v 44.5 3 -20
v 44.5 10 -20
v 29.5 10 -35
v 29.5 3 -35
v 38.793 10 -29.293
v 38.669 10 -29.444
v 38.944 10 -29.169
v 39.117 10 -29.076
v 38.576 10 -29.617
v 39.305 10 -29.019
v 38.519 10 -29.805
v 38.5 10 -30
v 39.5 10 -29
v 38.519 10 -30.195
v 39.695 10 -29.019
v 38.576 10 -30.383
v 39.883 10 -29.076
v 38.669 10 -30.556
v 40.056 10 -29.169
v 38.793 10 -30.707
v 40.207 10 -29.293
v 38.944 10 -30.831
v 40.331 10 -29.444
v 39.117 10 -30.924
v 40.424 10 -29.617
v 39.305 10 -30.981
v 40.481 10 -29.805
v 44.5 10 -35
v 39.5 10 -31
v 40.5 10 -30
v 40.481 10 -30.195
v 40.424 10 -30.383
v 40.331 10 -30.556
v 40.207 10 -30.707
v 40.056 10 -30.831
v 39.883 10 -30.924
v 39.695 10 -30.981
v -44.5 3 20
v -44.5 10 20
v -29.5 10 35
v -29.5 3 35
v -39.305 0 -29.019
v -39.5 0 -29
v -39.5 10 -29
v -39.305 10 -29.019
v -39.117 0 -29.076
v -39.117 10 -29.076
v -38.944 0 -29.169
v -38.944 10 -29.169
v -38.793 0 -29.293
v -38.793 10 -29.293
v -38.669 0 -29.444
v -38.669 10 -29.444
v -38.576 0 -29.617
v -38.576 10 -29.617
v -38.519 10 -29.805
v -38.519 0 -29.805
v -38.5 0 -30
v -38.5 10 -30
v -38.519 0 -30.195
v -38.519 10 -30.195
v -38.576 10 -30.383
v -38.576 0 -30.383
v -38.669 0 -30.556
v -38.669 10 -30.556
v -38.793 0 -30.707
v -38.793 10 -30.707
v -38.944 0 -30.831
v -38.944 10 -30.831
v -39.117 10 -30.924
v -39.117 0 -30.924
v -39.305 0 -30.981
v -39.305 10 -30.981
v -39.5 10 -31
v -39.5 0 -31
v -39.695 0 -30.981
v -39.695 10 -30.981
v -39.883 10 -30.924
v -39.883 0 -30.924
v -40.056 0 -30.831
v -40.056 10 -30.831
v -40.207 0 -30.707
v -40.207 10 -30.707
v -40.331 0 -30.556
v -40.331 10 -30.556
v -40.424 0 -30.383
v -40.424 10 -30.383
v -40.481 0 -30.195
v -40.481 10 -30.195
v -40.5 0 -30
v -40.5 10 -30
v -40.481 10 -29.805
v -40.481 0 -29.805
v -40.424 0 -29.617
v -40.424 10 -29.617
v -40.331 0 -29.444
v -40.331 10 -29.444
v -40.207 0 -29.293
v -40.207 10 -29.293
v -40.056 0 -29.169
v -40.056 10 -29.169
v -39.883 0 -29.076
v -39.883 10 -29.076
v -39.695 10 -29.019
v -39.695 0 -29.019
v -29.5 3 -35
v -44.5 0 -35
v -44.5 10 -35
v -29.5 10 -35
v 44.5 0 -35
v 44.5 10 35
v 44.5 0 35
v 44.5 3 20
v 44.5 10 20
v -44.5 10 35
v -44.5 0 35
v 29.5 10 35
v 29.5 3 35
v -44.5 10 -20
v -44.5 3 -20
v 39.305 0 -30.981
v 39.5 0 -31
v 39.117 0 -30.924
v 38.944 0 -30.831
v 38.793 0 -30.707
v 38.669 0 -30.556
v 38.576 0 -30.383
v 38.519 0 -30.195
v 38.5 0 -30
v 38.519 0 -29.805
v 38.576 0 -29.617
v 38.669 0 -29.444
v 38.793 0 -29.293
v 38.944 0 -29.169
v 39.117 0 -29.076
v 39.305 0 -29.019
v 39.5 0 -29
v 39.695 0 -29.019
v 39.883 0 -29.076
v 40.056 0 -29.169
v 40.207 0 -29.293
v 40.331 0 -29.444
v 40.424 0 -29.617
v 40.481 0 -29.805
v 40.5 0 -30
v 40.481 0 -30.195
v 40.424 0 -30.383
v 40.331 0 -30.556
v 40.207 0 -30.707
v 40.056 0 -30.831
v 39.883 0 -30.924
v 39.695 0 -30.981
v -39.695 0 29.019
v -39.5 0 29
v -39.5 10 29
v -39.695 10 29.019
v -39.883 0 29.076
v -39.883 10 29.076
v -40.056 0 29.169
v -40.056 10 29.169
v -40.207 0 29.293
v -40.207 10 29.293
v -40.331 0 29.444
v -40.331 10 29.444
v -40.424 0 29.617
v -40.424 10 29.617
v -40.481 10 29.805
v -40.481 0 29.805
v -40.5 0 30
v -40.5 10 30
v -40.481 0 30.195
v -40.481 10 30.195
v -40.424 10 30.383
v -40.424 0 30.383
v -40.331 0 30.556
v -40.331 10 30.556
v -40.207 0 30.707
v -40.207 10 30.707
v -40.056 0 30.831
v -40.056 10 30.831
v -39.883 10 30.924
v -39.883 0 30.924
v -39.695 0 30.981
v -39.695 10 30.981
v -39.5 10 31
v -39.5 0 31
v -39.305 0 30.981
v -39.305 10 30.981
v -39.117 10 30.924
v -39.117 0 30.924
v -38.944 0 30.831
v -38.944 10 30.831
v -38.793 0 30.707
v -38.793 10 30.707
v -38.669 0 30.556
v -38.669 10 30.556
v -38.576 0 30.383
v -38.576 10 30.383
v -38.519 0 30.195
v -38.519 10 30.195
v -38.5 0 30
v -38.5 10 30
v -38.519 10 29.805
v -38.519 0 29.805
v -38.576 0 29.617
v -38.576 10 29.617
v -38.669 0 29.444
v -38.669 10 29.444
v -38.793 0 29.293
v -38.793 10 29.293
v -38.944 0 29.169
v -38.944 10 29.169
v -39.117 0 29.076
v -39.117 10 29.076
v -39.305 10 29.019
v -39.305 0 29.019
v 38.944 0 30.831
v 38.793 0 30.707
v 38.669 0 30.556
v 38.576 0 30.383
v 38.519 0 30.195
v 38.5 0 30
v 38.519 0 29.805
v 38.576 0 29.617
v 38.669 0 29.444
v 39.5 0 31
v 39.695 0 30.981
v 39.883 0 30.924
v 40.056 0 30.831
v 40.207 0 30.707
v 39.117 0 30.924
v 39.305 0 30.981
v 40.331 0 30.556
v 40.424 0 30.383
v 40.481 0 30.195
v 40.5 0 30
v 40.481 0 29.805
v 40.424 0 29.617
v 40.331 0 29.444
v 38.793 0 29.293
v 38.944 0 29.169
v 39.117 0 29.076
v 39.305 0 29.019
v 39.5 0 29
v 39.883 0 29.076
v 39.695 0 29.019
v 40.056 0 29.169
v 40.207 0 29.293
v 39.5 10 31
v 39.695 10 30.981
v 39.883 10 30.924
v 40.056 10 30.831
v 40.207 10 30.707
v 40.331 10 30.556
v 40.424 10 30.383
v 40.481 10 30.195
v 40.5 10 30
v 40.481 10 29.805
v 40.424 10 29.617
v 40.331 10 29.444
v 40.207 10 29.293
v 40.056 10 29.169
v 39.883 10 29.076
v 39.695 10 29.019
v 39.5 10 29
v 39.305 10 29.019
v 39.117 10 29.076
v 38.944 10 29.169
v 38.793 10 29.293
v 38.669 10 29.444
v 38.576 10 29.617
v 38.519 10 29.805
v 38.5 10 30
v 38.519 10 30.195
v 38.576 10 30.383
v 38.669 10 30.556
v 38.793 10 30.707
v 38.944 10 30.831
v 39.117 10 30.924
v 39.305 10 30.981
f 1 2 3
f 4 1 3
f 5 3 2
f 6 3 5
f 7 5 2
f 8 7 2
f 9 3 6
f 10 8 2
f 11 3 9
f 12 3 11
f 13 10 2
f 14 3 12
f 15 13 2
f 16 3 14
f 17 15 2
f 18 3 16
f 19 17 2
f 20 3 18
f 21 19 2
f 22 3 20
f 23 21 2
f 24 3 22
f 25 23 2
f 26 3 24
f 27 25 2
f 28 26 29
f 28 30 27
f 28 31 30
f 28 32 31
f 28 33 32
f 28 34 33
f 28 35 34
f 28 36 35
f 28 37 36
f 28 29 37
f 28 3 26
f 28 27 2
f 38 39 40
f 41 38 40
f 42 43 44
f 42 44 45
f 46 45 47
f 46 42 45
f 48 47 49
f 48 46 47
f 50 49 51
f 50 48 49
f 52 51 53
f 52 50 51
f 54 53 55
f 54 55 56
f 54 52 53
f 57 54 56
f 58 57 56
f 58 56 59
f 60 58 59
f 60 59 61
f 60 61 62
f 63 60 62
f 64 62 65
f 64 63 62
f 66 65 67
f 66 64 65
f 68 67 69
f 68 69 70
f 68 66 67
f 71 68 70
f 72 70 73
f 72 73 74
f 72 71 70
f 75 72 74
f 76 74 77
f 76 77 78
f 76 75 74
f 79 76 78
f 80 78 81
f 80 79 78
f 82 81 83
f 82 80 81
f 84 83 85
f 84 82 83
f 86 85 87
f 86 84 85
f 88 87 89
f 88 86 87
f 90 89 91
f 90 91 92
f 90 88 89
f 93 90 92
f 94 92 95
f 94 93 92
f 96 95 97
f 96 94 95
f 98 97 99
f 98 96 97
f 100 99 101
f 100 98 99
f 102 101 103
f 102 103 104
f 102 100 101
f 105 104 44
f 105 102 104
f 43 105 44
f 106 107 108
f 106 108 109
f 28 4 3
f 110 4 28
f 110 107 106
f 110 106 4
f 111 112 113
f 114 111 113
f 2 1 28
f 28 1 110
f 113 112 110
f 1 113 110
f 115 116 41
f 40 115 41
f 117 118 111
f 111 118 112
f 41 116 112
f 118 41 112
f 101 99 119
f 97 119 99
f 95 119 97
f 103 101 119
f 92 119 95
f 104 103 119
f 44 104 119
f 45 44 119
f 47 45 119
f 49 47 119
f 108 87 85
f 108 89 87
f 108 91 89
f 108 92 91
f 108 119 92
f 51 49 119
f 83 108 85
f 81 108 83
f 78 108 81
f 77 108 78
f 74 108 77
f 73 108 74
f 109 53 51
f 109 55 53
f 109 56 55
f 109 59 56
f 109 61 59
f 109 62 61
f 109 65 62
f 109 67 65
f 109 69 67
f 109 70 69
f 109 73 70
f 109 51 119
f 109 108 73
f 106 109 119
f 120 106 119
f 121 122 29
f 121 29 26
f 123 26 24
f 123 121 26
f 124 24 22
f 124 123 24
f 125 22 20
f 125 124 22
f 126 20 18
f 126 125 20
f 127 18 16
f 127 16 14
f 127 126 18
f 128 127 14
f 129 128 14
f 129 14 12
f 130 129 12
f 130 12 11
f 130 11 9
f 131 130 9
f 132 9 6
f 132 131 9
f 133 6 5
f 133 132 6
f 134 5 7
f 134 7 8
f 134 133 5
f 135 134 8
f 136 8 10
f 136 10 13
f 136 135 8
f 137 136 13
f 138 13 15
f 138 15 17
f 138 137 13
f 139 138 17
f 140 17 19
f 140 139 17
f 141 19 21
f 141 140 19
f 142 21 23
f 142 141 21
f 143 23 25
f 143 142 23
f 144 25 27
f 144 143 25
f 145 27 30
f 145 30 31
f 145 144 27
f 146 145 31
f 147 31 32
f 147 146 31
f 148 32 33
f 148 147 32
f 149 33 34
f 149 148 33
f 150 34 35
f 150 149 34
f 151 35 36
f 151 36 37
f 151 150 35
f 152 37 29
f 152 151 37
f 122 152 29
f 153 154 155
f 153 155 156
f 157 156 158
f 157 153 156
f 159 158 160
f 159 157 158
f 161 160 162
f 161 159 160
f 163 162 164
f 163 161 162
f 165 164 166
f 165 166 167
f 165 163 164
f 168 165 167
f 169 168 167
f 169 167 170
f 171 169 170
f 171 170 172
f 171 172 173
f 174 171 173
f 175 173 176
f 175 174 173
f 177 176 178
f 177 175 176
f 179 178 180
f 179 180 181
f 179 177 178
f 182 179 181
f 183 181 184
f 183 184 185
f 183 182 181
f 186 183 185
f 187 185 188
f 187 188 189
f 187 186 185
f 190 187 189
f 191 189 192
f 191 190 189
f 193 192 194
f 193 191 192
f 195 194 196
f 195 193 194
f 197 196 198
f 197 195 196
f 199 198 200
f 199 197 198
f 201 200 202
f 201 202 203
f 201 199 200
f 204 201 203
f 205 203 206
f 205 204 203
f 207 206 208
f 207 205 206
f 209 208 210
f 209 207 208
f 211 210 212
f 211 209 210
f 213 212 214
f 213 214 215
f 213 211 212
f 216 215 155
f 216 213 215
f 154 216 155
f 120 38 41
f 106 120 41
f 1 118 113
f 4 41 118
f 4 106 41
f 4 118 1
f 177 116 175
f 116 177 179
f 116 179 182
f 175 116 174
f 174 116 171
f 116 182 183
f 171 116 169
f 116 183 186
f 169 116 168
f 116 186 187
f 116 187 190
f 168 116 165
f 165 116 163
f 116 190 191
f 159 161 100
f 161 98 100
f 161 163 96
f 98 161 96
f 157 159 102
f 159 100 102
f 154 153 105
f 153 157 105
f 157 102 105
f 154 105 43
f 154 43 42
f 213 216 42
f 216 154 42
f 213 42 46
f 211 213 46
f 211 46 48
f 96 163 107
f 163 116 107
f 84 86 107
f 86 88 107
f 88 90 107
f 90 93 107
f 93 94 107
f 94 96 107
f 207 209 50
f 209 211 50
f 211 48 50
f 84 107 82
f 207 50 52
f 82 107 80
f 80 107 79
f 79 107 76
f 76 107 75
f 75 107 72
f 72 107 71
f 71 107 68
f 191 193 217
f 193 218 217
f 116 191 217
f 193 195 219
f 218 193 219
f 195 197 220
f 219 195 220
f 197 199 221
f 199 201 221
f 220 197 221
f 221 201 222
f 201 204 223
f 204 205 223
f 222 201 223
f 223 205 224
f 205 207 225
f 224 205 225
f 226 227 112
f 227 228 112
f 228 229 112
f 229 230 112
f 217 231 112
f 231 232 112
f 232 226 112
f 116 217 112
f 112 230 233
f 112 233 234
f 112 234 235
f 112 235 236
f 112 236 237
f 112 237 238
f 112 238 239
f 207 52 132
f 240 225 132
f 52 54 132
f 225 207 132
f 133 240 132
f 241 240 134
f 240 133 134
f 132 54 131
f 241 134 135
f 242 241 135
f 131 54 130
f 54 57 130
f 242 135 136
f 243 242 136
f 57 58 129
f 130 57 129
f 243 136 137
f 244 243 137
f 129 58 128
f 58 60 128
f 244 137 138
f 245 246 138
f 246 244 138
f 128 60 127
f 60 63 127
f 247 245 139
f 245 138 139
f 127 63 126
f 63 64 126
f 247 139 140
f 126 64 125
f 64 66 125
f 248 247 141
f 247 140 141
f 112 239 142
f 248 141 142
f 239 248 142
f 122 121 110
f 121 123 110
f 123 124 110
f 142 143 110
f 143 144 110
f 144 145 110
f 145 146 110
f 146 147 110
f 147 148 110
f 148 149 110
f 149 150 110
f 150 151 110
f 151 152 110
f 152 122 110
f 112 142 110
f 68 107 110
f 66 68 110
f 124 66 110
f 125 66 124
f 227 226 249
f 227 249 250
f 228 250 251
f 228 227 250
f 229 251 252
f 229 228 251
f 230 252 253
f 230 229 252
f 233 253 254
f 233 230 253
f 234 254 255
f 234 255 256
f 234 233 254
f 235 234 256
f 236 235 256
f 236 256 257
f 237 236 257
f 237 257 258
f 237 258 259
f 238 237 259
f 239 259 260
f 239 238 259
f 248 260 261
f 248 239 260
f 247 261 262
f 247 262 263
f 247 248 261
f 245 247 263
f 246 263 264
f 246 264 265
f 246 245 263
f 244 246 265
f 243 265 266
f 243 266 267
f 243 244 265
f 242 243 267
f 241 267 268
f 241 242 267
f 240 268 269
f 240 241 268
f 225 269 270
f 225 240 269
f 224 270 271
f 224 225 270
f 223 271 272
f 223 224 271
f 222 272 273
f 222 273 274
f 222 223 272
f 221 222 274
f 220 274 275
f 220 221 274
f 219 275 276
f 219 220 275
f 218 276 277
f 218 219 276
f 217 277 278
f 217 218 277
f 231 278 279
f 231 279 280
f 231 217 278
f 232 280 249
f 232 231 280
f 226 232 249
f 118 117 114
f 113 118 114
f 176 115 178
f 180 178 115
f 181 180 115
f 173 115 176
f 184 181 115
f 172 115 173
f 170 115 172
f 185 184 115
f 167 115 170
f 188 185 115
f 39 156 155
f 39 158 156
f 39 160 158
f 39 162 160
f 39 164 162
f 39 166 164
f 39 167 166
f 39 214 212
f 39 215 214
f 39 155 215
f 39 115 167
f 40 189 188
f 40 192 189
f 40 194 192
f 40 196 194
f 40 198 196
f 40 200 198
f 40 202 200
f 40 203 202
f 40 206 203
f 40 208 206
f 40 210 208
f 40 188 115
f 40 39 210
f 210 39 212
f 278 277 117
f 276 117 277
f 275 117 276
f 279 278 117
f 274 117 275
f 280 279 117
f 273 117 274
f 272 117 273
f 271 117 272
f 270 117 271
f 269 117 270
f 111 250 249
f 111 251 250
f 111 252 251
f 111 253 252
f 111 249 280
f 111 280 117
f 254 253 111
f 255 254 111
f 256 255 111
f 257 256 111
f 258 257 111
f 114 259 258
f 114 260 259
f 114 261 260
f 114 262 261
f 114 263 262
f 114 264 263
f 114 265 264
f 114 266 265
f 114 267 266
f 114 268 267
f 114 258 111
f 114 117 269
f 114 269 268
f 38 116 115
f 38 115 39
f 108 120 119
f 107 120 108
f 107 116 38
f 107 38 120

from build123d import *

# Parameters (mm, degrees)
SKETCH1_W           = 89
SKETCH1_H           = 70
SKETCH1_R           = 1
BOSS_EXTRUDE1_DEPTH = 10
CUT_EXTRUDE2_DEPTH  = 7


with BuildPart() as part:
    # Sketch1 → Boss-Extrude1 (new body)
    with BuildSketch(Plane(origin=(0, 0, 0), x_dir=(1, 0, 0), z_dir=(0, 1, 0))):
        Rectangle(SKETCH1_W, SKETCH1_H)
        with Locations(Location((-39.5, 30, 0), (0, 0, 270))):
            Circle(SKETCH1_R, mode=Mode.SUBTRACT)
        with Locations(Location((39.5, 30, 0), (0, 0, 90))):
            Circle(SKETCH1_R, mode=Mode.SUBTRACT)
        with Locations(Location((39.5, -30, 0), (0, 0, 270))):
            Circle(SKETCH1_R, mode=Mode.SUBTRACT)
        with Locations(Location((-39.5, -30, 0), (0, 0, 90))):
            Circle(SKETCH1_R, mode=Mode.SUBTRACT)
    extrude(amount=BOSS_EXTRUDE1_DEPTH)

    # Sketch3 → Cut-Extrude2 (cut)
    with BuildSketch(Plane(origin=(0, 10, 0), x_dir=(1, 0, 0), z_dir=(0, 1, 0))):
        Polygon((-44.5, -20), (-29.5, -35), (29.5, -35), (44.5, -20), (44.5, 20), (29.5, 35), (-29.5, 35), (-44.5, 20), align=None)
    extrude(amount=-CUT_EXTRUDE2_DEPTH, mode=Mode.SUBTRACT)


solid = part.part
